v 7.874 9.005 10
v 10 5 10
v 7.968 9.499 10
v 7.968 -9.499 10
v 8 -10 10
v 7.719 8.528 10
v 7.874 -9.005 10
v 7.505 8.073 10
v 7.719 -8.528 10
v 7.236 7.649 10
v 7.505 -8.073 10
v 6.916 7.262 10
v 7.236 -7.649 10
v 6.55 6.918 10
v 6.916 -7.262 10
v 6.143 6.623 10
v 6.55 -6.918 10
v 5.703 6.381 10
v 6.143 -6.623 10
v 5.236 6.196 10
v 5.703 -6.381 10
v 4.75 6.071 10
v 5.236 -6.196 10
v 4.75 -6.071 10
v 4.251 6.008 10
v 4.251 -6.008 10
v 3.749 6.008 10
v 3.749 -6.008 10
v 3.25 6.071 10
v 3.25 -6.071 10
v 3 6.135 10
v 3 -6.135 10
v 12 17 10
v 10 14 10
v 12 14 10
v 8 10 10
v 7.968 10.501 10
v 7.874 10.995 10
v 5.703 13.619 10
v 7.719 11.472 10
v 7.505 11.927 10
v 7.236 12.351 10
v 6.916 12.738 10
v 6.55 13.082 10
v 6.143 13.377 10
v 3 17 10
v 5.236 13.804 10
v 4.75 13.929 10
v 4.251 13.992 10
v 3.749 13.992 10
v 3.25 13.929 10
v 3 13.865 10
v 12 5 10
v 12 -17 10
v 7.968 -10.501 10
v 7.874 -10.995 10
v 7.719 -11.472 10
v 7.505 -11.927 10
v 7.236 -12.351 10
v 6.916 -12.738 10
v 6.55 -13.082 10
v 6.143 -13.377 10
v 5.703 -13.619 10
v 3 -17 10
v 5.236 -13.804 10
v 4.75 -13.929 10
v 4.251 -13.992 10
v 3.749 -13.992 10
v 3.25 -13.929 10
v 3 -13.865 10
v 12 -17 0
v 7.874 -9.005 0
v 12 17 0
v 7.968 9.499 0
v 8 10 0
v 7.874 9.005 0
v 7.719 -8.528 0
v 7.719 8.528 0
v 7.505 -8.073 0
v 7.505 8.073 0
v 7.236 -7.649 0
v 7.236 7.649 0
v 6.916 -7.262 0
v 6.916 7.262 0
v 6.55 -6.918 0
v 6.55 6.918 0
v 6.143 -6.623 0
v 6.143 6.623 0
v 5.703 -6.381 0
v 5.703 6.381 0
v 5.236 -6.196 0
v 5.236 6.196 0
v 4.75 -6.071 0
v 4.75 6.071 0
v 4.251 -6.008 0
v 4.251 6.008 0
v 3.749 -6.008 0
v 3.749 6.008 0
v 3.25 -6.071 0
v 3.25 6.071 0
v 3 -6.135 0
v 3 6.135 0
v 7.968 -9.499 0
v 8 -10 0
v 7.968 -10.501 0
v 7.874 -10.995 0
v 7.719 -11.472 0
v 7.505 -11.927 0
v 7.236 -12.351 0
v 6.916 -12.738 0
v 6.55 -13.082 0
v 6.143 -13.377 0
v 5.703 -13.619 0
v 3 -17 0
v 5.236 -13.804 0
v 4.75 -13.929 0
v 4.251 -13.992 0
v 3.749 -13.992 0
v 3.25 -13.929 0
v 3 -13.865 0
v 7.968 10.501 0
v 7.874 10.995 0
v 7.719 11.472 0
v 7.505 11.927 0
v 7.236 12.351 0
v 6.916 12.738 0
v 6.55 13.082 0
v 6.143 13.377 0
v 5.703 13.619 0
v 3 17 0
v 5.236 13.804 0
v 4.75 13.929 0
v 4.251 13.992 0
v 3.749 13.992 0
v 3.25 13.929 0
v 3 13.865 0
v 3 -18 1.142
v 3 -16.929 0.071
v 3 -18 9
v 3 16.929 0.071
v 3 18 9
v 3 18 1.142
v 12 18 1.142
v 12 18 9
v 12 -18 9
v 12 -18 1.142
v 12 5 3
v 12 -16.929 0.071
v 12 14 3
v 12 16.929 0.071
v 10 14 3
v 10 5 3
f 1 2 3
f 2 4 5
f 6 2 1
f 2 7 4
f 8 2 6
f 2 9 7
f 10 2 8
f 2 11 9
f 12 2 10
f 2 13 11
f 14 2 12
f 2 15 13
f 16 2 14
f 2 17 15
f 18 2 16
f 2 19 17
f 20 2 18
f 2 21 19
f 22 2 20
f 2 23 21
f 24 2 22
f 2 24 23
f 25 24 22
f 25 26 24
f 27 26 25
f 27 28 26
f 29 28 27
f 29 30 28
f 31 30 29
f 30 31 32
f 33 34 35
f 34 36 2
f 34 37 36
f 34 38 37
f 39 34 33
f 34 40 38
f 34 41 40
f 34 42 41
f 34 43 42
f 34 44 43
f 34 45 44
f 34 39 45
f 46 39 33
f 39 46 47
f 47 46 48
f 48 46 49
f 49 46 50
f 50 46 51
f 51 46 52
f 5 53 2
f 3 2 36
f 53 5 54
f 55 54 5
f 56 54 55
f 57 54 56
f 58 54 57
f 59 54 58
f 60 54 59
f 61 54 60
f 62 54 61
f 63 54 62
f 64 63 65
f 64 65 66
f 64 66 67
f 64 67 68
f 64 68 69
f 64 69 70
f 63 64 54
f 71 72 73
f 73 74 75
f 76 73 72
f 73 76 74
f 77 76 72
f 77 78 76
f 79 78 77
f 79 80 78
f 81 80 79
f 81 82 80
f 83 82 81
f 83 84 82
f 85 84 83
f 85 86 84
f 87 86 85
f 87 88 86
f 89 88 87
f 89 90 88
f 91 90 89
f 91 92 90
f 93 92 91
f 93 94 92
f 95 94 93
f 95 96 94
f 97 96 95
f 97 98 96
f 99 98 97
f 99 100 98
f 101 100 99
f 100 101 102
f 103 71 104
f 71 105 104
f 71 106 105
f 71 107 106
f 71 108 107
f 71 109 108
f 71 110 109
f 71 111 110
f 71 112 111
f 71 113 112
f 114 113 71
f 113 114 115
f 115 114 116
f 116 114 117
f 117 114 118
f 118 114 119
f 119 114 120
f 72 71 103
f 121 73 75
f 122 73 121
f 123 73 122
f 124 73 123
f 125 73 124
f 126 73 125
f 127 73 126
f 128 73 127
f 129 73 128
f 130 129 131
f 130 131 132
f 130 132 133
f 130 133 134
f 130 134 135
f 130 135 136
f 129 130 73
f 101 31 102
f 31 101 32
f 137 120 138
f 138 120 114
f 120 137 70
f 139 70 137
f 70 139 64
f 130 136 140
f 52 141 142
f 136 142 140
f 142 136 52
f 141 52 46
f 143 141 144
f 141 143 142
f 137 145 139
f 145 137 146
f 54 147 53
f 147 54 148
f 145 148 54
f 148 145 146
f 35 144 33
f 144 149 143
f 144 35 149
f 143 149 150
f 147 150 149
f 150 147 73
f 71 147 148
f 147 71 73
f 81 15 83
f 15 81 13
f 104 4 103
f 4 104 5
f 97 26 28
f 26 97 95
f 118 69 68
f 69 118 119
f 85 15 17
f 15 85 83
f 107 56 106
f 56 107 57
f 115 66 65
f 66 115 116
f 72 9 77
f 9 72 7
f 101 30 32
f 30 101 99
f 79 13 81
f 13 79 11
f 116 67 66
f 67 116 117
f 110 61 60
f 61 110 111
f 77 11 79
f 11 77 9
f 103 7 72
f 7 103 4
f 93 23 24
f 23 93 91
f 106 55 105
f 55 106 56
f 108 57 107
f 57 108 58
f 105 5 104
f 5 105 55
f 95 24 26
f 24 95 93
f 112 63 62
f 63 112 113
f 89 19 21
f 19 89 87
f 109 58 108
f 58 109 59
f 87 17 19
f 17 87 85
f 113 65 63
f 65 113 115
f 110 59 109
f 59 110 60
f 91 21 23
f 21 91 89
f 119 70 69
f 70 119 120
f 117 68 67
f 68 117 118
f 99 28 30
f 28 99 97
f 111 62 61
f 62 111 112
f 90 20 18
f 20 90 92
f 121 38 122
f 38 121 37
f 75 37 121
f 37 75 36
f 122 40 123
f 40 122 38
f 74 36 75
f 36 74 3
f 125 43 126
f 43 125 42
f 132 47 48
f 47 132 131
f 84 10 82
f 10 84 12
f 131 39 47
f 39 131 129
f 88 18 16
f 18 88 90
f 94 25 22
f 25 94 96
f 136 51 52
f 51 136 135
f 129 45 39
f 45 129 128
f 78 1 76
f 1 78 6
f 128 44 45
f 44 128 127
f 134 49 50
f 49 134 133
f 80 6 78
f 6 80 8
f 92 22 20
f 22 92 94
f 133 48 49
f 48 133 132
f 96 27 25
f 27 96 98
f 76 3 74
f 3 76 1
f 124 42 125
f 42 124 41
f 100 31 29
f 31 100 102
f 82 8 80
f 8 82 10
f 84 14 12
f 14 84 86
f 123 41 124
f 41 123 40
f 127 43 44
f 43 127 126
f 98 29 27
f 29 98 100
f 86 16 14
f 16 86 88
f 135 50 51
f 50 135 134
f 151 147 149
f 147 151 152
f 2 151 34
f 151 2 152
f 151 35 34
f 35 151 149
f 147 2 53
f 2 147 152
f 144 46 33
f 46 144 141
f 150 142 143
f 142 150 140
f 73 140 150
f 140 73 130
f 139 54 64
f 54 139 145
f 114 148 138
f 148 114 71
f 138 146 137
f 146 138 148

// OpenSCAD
// PRUSA iteration3
// X carriage
// GNU GPL v3
// Josef Průša <iam@josefprusa.cz> and contributors
// http://www.reprap.org/wiki/Prusa_Mendel
// http://prusamendel.org

difference()
{

//body    
union()
{
    translate([3,-18,0]) cube([5,36,10]);
    translate([8,-18,0]) cube([4,36,10]);
}


union()
{
    //rods
    translate(v = [4,-10,-1]) cylinder(h = 12, r=4, $fn=50);	
    translate(v = [4,10,-1]) cylinder(h = 12, r=4, $fn=50);
    //cables
    translate([10,5,3]) cube([8,9,10]);
}

        //corners
        translate([-5,24,3]) rotate([45,0,0]) cube([20,10,10]);
        translate([-5,24,-7]) rotate([45,0,0]) cube([20,10,10]);
        translate([-5,-24,3]) rotate([45,0,0]) cube([20,10,10]);
        translate([-5,-24,-7]) rotate([45,0,0]) cube([20,10,10]);
}
